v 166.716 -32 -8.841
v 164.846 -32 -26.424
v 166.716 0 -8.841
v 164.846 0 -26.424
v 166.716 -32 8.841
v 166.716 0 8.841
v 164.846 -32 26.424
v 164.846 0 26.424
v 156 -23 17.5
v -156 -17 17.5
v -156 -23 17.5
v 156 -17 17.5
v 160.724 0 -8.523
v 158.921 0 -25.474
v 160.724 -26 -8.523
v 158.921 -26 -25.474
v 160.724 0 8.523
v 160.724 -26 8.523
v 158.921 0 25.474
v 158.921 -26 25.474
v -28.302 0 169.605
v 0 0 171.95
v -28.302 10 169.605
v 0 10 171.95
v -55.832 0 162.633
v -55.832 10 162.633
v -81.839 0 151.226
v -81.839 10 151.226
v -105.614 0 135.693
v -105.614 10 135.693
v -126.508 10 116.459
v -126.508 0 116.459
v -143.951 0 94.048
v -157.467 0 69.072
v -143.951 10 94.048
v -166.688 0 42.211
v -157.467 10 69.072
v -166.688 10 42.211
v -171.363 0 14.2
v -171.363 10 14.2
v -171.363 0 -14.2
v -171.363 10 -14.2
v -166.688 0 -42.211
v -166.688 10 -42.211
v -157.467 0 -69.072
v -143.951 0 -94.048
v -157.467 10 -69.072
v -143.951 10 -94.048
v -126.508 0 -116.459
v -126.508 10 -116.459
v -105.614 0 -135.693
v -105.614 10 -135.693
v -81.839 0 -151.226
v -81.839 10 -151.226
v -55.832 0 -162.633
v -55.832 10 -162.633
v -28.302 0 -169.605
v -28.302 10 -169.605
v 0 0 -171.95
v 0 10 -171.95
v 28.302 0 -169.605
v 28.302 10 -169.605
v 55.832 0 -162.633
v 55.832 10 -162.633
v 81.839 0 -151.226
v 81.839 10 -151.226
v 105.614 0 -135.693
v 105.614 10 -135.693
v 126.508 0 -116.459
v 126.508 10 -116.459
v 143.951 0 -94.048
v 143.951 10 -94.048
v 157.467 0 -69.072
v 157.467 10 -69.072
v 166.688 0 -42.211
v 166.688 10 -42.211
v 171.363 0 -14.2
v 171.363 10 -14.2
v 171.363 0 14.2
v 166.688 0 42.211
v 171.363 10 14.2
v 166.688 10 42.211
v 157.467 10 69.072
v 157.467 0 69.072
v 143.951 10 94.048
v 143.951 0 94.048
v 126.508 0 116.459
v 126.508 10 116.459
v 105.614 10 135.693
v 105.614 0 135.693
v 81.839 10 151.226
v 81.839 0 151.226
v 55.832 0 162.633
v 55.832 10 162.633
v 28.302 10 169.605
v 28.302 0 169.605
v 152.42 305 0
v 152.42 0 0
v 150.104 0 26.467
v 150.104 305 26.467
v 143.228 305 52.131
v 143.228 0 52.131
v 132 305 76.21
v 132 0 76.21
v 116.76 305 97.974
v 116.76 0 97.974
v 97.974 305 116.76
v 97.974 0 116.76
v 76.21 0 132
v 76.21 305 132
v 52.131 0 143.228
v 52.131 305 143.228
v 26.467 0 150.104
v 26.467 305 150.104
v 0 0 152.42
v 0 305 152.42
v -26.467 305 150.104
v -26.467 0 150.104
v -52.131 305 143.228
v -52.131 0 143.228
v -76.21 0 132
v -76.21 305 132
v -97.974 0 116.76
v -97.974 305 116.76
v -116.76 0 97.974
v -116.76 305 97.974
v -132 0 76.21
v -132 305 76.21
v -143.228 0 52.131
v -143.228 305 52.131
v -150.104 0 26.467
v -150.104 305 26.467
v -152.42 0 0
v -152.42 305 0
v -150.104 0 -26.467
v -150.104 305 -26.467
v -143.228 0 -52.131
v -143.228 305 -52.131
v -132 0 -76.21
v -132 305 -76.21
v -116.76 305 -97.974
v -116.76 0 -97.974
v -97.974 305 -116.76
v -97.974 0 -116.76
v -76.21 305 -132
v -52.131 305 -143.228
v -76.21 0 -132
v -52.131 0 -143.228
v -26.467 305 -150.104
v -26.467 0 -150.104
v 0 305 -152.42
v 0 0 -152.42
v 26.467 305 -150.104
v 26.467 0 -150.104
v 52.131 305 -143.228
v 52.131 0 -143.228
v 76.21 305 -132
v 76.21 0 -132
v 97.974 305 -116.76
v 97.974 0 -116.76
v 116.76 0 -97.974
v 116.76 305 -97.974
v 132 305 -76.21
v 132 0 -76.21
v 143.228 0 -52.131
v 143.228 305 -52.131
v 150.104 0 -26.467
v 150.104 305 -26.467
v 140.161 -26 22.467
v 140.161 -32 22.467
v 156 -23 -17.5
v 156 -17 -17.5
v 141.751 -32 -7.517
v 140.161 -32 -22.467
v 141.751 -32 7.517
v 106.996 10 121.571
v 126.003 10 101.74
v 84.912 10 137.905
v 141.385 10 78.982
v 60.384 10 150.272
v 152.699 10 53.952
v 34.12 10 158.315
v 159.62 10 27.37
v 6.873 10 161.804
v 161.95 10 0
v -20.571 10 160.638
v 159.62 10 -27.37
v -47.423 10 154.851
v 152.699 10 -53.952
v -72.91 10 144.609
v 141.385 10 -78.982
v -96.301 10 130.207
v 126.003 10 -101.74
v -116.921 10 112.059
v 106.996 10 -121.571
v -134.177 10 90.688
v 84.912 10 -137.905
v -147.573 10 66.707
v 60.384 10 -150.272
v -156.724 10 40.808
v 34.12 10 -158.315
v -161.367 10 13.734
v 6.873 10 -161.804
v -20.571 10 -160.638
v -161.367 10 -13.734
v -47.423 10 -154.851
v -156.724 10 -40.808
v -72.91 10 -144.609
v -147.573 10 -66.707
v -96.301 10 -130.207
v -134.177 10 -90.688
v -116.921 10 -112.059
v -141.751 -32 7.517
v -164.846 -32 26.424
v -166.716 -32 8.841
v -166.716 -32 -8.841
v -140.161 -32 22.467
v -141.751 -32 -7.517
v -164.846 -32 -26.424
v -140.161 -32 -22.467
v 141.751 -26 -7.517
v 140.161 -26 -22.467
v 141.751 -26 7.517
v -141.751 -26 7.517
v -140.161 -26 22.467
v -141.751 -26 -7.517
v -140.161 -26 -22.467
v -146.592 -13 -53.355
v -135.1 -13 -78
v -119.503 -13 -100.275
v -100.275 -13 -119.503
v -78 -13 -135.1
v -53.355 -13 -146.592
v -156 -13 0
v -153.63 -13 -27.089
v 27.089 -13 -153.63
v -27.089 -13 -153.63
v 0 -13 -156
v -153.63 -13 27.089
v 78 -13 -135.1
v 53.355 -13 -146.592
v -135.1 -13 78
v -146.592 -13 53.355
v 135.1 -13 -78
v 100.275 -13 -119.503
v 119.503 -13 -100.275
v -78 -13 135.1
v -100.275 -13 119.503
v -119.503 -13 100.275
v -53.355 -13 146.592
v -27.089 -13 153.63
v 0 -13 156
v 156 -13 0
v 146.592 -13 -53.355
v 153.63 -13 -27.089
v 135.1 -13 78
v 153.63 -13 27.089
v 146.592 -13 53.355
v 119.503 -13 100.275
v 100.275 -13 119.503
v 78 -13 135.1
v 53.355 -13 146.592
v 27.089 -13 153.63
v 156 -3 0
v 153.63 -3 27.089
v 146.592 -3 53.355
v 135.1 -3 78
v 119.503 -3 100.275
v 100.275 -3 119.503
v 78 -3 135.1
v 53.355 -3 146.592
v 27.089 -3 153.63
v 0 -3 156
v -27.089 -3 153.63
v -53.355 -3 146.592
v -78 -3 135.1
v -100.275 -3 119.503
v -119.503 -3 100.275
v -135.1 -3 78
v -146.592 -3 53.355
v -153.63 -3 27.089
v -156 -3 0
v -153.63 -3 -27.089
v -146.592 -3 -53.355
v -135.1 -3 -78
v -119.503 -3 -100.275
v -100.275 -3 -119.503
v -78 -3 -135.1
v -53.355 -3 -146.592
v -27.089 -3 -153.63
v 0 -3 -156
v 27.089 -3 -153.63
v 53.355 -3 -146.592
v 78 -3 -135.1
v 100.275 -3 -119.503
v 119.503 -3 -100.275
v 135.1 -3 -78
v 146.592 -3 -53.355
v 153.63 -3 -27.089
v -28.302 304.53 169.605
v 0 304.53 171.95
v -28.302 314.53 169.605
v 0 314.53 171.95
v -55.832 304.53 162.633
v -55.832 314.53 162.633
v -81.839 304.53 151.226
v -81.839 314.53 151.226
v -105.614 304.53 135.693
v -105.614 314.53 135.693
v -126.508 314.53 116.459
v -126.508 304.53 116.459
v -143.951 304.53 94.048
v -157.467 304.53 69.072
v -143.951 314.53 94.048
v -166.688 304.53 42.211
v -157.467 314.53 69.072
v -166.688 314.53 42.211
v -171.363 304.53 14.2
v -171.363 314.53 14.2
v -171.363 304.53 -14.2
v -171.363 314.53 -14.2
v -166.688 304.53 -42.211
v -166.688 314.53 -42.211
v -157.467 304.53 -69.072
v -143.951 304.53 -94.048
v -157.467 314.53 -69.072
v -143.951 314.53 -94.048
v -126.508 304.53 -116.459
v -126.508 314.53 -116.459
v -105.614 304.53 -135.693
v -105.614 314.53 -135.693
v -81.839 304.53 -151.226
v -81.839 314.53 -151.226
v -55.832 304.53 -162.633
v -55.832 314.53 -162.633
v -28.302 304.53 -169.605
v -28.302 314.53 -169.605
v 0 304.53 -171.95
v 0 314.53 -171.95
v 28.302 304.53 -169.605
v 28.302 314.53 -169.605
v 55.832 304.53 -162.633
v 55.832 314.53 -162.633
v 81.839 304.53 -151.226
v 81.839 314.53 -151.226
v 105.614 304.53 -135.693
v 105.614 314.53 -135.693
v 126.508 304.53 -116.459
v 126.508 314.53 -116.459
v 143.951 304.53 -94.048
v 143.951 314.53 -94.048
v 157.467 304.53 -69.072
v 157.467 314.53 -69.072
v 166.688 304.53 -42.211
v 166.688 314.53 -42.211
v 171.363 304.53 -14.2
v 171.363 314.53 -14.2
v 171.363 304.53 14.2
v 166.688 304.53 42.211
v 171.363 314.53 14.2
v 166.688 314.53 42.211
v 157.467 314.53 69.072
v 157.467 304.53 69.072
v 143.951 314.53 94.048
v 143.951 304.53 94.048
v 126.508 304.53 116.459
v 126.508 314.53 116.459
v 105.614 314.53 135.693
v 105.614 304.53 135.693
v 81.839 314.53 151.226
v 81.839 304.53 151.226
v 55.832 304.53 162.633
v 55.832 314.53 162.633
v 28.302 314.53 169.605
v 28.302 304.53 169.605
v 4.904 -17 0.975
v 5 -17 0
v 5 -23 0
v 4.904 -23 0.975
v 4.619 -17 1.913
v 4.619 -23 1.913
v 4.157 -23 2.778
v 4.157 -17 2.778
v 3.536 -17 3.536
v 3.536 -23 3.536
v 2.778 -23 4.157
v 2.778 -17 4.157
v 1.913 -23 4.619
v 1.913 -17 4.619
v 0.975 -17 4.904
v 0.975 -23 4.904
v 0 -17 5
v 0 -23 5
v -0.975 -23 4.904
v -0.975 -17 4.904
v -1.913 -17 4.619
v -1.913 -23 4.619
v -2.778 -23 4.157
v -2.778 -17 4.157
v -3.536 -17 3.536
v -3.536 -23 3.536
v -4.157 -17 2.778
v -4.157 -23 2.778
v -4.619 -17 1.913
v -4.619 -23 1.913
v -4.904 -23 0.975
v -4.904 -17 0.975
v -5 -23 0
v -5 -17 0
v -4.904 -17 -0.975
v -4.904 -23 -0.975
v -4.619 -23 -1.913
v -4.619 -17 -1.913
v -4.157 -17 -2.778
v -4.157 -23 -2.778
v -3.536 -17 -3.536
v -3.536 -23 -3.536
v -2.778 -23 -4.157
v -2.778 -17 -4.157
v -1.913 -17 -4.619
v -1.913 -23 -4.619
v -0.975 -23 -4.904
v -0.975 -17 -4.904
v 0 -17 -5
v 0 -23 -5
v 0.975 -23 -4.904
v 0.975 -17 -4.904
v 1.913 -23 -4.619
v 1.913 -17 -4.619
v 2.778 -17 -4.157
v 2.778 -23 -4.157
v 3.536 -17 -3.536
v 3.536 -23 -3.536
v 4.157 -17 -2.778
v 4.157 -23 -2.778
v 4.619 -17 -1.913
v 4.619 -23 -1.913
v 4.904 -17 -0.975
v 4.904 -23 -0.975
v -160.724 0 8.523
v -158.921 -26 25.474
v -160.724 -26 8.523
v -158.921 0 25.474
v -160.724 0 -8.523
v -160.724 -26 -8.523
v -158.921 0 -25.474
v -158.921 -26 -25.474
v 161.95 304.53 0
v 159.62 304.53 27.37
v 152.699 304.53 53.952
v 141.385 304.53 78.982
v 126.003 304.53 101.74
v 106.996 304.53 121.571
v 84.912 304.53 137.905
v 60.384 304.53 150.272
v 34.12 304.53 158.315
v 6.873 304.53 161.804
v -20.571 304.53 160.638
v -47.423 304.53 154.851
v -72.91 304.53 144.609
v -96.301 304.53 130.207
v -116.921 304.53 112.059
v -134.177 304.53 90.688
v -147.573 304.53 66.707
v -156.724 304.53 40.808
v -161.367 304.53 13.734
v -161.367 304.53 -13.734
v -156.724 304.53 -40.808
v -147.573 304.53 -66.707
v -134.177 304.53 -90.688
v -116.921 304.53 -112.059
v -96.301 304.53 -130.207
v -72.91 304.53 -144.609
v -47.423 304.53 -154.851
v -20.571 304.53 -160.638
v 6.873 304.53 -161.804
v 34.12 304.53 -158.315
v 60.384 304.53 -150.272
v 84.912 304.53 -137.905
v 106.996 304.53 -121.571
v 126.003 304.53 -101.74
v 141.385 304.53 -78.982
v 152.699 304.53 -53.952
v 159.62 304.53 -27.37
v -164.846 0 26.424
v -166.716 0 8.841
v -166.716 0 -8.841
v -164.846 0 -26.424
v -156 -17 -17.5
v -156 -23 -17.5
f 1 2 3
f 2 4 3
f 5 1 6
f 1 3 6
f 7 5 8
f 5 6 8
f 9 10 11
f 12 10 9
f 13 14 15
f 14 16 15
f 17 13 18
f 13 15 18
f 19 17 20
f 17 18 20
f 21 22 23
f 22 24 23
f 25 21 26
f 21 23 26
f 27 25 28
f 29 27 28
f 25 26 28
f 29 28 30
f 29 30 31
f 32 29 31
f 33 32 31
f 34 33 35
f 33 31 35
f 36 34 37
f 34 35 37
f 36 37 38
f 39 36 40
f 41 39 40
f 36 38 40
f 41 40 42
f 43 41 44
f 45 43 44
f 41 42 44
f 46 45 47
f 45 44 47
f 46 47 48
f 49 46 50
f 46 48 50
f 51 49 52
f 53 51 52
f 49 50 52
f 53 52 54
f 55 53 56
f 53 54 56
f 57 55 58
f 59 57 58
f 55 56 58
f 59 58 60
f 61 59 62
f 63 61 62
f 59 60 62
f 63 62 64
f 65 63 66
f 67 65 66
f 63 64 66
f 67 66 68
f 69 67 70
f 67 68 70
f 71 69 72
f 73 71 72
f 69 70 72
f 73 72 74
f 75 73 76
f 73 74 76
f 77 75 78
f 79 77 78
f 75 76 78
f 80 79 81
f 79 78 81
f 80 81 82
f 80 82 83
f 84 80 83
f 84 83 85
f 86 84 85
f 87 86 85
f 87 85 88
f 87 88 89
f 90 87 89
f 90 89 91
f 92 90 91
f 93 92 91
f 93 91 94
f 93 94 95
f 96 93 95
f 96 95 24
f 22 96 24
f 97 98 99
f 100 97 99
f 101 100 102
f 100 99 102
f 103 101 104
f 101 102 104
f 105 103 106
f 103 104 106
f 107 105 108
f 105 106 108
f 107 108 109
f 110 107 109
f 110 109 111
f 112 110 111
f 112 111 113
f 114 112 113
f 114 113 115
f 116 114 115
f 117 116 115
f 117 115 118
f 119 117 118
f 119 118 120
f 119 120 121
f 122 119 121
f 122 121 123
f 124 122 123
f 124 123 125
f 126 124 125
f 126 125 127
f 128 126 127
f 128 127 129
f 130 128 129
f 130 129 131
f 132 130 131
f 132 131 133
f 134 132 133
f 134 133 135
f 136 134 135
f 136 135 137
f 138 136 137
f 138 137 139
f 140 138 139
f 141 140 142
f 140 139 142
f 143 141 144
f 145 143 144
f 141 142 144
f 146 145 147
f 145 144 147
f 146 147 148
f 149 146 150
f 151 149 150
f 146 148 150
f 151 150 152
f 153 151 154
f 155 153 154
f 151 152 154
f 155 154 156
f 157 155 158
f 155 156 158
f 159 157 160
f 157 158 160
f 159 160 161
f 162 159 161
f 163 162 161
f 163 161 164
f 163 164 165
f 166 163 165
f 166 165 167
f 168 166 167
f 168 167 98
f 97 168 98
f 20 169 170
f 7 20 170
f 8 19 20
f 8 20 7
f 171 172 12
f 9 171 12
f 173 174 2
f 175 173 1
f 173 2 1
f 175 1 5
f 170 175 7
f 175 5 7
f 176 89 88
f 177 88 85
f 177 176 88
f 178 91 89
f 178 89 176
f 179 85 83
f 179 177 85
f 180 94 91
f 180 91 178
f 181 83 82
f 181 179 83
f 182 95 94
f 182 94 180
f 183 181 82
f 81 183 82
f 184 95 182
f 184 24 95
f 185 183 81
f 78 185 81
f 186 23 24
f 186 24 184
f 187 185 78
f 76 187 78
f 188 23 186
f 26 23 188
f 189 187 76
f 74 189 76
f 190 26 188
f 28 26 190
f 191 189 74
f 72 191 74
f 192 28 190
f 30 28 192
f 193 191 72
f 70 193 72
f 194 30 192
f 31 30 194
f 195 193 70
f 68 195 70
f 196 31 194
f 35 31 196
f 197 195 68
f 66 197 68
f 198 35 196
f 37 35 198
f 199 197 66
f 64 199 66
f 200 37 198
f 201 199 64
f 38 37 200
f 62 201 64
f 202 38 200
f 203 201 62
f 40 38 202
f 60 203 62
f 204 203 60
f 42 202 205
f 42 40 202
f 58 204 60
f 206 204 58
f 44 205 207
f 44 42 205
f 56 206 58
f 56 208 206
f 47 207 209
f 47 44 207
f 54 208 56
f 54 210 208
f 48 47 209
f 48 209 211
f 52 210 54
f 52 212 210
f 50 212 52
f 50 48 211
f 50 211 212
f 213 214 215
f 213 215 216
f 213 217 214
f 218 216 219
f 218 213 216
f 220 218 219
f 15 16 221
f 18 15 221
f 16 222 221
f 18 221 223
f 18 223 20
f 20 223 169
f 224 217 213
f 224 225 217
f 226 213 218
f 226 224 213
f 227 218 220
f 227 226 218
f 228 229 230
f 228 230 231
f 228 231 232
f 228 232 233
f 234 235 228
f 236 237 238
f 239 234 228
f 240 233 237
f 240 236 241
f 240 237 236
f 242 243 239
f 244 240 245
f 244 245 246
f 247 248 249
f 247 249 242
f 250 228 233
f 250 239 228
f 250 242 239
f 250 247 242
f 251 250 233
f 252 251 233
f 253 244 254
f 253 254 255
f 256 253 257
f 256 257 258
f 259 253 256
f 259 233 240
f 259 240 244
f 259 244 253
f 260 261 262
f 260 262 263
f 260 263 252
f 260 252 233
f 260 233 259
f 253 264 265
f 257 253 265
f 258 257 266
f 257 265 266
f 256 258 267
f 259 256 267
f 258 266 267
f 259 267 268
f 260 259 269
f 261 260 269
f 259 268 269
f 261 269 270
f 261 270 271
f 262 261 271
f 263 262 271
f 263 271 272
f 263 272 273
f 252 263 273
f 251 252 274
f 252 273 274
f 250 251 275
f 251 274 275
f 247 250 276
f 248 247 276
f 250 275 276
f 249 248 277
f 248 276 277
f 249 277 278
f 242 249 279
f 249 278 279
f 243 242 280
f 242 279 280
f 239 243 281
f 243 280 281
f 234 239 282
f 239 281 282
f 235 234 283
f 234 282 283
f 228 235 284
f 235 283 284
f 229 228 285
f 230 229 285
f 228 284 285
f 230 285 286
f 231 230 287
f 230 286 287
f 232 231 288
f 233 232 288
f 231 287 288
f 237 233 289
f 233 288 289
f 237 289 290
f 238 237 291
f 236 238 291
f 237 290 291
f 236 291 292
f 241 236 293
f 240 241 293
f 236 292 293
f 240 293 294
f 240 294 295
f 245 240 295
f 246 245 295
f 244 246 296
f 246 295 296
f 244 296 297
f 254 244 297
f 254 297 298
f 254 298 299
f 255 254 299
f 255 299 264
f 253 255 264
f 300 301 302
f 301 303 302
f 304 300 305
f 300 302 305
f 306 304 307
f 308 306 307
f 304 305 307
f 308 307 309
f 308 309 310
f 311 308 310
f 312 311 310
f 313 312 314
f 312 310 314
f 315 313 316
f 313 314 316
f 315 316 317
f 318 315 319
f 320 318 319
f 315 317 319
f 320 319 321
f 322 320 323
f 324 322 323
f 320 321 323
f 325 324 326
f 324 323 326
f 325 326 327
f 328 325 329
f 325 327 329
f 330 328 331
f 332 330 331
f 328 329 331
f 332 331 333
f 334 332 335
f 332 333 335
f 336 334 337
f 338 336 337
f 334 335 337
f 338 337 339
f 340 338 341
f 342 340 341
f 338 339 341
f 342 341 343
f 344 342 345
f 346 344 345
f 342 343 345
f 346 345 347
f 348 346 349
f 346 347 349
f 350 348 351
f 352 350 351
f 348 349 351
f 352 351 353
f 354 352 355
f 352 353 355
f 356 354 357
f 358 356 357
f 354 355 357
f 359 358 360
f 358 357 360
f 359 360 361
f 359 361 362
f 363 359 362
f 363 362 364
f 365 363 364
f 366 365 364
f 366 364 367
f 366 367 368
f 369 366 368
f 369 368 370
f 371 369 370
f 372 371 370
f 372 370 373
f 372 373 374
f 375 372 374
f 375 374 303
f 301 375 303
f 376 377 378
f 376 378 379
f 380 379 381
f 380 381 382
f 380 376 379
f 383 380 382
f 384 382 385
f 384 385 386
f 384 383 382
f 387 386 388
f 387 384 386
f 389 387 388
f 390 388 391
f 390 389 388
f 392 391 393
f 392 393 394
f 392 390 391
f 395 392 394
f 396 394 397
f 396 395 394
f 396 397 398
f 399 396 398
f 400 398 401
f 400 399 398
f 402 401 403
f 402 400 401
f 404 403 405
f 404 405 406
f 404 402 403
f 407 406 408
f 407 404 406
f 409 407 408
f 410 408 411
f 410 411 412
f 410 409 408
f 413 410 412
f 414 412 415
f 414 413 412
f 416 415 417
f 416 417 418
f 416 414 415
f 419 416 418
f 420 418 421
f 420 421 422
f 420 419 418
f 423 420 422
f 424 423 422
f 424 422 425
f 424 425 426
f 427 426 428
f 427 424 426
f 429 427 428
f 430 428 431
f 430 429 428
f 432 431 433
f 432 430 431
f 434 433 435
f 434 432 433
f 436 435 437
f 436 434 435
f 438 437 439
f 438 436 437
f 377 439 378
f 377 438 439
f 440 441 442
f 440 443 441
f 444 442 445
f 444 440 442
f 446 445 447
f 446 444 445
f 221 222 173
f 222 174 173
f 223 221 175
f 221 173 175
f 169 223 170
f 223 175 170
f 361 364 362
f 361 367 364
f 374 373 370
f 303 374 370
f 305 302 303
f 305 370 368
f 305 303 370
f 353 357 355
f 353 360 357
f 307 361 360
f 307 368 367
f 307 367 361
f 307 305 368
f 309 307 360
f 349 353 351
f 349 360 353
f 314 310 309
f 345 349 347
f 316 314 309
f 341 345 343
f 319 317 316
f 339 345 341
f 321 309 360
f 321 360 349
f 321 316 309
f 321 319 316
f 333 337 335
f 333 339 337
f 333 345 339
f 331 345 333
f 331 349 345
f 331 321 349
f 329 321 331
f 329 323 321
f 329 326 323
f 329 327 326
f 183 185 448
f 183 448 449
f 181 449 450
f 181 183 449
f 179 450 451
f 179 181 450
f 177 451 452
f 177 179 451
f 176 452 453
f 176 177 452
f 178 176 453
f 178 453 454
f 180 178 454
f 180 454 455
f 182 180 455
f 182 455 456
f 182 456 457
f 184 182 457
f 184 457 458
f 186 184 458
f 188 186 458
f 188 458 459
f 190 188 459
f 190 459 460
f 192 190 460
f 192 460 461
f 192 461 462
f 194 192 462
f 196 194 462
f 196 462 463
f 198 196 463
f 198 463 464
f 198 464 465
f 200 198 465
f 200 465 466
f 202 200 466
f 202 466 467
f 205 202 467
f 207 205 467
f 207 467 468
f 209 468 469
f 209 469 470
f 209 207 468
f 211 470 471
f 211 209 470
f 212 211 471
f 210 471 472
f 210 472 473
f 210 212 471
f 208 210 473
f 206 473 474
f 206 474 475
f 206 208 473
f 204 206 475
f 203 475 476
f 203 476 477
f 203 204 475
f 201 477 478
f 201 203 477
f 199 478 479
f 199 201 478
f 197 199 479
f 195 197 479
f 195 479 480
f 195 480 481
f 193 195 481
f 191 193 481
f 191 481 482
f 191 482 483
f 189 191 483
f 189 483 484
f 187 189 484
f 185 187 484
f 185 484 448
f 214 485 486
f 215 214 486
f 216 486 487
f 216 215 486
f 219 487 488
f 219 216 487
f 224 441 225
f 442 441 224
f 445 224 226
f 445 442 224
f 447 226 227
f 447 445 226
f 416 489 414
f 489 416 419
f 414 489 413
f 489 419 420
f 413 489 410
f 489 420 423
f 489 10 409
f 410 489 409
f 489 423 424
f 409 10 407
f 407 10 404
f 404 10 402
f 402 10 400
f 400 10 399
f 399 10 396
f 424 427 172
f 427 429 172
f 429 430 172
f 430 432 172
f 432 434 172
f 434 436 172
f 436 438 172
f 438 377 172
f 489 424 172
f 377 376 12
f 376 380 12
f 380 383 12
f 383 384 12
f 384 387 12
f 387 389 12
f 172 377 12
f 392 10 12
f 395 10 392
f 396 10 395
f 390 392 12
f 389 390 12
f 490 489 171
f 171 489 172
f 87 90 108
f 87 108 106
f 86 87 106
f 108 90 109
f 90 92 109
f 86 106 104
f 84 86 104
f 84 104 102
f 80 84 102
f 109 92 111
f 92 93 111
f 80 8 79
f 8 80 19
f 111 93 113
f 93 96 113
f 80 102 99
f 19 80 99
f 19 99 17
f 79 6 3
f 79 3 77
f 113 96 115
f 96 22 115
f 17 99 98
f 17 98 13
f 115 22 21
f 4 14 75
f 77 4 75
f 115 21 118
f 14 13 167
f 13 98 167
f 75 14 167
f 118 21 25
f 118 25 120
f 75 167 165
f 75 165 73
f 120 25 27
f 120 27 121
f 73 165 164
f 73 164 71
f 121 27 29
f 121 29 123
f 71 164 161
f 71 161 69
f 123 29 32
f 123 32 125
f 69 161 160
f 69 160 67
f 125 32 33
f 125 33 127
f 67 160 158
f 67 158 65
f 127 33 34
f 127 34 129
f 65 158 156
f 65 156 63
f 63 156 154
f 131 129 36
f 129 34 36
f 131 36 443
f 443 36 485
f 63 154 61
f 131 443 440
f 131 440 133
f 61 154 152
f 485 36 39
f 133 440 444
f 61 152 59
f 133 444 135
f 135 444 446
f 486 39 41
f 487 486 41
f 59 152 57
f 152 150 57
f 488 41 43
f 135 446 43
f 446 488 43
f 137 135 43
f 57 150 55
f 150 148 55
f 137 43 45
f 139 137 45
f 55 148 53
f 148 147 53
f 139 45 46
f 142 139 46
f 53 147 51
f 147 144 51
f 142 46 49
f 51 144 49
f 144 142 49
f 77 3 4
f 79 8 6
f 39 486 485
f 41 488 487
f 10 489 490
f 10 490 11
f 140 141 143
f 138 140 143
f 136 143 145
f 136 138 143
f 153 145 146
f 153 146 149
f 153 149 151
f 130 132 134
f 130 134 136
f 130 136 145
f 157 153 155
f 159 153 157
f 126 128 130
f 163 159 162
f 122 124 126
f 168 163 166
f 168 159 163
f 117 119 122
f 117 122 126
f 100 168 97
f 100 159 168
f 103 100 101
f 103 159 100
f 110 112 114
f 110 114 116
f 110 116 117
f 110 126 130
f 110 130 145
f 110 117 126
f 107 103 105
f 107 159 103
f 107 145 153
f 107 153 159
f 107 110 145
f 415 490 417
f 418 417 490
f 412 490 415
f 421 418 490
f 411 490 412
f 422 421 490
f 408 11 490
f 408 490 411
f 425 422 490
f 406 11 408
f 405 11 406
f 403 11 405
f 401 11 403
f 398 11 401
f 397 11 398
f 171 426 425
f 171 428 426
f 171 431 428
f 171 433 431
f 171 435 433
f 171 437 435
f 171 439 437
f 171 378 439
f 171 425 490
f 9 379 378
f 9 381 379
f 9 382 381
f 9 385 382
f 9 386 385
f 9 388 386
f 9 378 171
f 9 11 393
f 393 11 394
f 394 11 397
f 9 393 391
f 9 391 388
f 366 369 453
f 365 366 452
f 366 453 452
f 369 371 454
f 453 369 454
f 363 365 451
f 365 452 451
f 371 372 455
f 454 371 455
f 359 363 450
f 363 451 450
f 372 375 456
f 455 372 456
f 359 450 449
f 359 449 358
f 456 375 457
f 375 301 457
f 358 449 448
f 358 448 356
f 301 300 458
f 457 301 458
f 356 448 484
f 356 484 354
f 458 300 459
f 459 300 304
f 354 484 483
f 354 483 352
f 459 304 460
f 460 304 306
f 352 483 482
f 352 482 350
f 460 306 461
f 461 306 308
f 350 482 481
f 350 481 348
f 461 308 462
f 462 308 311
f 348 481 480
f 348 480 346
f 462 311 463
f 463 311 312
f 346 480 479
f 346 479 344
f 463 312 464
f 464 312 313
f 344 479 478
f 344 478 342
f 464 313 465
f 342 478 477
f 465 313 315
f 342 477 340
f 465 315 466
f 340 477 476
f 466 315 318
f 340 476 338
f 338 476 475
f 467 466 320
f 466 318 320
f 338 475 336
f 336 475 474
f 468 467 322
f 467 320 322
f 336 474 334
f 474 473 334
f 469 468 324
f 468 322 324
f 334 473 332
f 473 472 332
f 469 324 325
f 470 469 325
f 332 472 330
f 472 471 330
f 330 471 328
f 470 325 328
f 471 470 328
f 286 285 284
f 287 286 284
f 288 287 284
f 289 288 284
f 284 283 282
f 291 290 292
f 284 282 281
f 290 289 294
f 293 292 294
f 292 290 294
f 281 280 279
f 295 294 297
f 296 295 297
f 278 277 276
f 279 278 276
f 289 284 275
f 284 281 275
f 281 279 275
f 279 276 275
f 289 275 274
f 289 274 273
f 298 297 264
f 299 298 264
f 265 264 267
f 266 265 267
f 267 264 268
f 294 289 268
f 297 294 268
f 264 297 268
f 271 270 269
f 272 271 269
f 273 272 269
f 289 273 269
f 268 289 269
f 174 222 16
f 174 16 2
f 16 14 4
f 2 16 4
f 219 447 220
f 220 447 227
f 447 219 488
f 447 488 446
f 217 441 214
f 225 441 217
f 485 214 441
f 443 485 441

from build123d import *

# Parameters (mm, degrees)
F0_R      = 161.95
F1_DEPTH  = 314.53
F2_T      = -9.53
F6_W      = 10
F6_H      = 10
F9_R      = 156
F10_DEPTH = 10
F12_W     = 312
F12_H     = 35
F12_R     = 5
F13_DEPTH = 6


with BuildPart() as f1:
    # F0 (on Front) → F1 (new body)
    with BuildSketch(Plane.XZ):
        Circle(F0_R)
    extrude(amount=-F1_DEPTH)

    # F2
    f2_openings = [f1.faces().sort_by_distance(p)[0] for p in [
        (0, 0, 0),
    ]]
    offset(amount=F2_T, openings=f2_openings)

    # F5: sweep along a path in F3
    with BuildLine(Plane.XZ) as f5_path:
        ThreePointArc((155.9621427626, -25), (157.9531258795, 0), (155.9621427626, 25))
    # F4 (on Top) → F5 (sweep)
    with BuildSketch(Plane.XY):
        Polygon((166.95, -32), (166.95, 0), (160.95, 0), (160.95, -26), (141.95, -26), (141.95, -32), align=None)
        Polygon((-141.95, -26), (-160.95, -26), (-160.95, 0), (-166.95, 0), (-166.95, -32), (-141.95, -32), align=None)
    sweep(path=f5_path.line)

    # F6 (on Right) → F7 (revolve)
    with BuildSketch(Plane.YZ):
        with Locations((5, 166.95)):
            Rectangle(F6_W, F6_H)
        with Locations((309.53, 166.95)):
            Rectangle(F6_W, F6_H)
    revolve(axis=Axis((0, 0, 0), (0, -1, 0)))


with BuildPart() as f10:
    # F9 (on offset) → F10 (new body)
    with BuildSketch(Plane.XZ.offset(3)):
        Circle(F9_R)
    extrude(amount=F10_DEPTH)


with BuildPart() as f13:
    # F12 (on offset) → F13 (new body)
    with BuildSketch(Plane.XZ.offset(17)):
        Rectangle(F12_W, F12_H)
        Circle(F12_R, mode=Mode.SUBTRACT)
    extrude(amount=F13_DEPTH)


solid = Compound([f1.part, f10.part, f13.part])
